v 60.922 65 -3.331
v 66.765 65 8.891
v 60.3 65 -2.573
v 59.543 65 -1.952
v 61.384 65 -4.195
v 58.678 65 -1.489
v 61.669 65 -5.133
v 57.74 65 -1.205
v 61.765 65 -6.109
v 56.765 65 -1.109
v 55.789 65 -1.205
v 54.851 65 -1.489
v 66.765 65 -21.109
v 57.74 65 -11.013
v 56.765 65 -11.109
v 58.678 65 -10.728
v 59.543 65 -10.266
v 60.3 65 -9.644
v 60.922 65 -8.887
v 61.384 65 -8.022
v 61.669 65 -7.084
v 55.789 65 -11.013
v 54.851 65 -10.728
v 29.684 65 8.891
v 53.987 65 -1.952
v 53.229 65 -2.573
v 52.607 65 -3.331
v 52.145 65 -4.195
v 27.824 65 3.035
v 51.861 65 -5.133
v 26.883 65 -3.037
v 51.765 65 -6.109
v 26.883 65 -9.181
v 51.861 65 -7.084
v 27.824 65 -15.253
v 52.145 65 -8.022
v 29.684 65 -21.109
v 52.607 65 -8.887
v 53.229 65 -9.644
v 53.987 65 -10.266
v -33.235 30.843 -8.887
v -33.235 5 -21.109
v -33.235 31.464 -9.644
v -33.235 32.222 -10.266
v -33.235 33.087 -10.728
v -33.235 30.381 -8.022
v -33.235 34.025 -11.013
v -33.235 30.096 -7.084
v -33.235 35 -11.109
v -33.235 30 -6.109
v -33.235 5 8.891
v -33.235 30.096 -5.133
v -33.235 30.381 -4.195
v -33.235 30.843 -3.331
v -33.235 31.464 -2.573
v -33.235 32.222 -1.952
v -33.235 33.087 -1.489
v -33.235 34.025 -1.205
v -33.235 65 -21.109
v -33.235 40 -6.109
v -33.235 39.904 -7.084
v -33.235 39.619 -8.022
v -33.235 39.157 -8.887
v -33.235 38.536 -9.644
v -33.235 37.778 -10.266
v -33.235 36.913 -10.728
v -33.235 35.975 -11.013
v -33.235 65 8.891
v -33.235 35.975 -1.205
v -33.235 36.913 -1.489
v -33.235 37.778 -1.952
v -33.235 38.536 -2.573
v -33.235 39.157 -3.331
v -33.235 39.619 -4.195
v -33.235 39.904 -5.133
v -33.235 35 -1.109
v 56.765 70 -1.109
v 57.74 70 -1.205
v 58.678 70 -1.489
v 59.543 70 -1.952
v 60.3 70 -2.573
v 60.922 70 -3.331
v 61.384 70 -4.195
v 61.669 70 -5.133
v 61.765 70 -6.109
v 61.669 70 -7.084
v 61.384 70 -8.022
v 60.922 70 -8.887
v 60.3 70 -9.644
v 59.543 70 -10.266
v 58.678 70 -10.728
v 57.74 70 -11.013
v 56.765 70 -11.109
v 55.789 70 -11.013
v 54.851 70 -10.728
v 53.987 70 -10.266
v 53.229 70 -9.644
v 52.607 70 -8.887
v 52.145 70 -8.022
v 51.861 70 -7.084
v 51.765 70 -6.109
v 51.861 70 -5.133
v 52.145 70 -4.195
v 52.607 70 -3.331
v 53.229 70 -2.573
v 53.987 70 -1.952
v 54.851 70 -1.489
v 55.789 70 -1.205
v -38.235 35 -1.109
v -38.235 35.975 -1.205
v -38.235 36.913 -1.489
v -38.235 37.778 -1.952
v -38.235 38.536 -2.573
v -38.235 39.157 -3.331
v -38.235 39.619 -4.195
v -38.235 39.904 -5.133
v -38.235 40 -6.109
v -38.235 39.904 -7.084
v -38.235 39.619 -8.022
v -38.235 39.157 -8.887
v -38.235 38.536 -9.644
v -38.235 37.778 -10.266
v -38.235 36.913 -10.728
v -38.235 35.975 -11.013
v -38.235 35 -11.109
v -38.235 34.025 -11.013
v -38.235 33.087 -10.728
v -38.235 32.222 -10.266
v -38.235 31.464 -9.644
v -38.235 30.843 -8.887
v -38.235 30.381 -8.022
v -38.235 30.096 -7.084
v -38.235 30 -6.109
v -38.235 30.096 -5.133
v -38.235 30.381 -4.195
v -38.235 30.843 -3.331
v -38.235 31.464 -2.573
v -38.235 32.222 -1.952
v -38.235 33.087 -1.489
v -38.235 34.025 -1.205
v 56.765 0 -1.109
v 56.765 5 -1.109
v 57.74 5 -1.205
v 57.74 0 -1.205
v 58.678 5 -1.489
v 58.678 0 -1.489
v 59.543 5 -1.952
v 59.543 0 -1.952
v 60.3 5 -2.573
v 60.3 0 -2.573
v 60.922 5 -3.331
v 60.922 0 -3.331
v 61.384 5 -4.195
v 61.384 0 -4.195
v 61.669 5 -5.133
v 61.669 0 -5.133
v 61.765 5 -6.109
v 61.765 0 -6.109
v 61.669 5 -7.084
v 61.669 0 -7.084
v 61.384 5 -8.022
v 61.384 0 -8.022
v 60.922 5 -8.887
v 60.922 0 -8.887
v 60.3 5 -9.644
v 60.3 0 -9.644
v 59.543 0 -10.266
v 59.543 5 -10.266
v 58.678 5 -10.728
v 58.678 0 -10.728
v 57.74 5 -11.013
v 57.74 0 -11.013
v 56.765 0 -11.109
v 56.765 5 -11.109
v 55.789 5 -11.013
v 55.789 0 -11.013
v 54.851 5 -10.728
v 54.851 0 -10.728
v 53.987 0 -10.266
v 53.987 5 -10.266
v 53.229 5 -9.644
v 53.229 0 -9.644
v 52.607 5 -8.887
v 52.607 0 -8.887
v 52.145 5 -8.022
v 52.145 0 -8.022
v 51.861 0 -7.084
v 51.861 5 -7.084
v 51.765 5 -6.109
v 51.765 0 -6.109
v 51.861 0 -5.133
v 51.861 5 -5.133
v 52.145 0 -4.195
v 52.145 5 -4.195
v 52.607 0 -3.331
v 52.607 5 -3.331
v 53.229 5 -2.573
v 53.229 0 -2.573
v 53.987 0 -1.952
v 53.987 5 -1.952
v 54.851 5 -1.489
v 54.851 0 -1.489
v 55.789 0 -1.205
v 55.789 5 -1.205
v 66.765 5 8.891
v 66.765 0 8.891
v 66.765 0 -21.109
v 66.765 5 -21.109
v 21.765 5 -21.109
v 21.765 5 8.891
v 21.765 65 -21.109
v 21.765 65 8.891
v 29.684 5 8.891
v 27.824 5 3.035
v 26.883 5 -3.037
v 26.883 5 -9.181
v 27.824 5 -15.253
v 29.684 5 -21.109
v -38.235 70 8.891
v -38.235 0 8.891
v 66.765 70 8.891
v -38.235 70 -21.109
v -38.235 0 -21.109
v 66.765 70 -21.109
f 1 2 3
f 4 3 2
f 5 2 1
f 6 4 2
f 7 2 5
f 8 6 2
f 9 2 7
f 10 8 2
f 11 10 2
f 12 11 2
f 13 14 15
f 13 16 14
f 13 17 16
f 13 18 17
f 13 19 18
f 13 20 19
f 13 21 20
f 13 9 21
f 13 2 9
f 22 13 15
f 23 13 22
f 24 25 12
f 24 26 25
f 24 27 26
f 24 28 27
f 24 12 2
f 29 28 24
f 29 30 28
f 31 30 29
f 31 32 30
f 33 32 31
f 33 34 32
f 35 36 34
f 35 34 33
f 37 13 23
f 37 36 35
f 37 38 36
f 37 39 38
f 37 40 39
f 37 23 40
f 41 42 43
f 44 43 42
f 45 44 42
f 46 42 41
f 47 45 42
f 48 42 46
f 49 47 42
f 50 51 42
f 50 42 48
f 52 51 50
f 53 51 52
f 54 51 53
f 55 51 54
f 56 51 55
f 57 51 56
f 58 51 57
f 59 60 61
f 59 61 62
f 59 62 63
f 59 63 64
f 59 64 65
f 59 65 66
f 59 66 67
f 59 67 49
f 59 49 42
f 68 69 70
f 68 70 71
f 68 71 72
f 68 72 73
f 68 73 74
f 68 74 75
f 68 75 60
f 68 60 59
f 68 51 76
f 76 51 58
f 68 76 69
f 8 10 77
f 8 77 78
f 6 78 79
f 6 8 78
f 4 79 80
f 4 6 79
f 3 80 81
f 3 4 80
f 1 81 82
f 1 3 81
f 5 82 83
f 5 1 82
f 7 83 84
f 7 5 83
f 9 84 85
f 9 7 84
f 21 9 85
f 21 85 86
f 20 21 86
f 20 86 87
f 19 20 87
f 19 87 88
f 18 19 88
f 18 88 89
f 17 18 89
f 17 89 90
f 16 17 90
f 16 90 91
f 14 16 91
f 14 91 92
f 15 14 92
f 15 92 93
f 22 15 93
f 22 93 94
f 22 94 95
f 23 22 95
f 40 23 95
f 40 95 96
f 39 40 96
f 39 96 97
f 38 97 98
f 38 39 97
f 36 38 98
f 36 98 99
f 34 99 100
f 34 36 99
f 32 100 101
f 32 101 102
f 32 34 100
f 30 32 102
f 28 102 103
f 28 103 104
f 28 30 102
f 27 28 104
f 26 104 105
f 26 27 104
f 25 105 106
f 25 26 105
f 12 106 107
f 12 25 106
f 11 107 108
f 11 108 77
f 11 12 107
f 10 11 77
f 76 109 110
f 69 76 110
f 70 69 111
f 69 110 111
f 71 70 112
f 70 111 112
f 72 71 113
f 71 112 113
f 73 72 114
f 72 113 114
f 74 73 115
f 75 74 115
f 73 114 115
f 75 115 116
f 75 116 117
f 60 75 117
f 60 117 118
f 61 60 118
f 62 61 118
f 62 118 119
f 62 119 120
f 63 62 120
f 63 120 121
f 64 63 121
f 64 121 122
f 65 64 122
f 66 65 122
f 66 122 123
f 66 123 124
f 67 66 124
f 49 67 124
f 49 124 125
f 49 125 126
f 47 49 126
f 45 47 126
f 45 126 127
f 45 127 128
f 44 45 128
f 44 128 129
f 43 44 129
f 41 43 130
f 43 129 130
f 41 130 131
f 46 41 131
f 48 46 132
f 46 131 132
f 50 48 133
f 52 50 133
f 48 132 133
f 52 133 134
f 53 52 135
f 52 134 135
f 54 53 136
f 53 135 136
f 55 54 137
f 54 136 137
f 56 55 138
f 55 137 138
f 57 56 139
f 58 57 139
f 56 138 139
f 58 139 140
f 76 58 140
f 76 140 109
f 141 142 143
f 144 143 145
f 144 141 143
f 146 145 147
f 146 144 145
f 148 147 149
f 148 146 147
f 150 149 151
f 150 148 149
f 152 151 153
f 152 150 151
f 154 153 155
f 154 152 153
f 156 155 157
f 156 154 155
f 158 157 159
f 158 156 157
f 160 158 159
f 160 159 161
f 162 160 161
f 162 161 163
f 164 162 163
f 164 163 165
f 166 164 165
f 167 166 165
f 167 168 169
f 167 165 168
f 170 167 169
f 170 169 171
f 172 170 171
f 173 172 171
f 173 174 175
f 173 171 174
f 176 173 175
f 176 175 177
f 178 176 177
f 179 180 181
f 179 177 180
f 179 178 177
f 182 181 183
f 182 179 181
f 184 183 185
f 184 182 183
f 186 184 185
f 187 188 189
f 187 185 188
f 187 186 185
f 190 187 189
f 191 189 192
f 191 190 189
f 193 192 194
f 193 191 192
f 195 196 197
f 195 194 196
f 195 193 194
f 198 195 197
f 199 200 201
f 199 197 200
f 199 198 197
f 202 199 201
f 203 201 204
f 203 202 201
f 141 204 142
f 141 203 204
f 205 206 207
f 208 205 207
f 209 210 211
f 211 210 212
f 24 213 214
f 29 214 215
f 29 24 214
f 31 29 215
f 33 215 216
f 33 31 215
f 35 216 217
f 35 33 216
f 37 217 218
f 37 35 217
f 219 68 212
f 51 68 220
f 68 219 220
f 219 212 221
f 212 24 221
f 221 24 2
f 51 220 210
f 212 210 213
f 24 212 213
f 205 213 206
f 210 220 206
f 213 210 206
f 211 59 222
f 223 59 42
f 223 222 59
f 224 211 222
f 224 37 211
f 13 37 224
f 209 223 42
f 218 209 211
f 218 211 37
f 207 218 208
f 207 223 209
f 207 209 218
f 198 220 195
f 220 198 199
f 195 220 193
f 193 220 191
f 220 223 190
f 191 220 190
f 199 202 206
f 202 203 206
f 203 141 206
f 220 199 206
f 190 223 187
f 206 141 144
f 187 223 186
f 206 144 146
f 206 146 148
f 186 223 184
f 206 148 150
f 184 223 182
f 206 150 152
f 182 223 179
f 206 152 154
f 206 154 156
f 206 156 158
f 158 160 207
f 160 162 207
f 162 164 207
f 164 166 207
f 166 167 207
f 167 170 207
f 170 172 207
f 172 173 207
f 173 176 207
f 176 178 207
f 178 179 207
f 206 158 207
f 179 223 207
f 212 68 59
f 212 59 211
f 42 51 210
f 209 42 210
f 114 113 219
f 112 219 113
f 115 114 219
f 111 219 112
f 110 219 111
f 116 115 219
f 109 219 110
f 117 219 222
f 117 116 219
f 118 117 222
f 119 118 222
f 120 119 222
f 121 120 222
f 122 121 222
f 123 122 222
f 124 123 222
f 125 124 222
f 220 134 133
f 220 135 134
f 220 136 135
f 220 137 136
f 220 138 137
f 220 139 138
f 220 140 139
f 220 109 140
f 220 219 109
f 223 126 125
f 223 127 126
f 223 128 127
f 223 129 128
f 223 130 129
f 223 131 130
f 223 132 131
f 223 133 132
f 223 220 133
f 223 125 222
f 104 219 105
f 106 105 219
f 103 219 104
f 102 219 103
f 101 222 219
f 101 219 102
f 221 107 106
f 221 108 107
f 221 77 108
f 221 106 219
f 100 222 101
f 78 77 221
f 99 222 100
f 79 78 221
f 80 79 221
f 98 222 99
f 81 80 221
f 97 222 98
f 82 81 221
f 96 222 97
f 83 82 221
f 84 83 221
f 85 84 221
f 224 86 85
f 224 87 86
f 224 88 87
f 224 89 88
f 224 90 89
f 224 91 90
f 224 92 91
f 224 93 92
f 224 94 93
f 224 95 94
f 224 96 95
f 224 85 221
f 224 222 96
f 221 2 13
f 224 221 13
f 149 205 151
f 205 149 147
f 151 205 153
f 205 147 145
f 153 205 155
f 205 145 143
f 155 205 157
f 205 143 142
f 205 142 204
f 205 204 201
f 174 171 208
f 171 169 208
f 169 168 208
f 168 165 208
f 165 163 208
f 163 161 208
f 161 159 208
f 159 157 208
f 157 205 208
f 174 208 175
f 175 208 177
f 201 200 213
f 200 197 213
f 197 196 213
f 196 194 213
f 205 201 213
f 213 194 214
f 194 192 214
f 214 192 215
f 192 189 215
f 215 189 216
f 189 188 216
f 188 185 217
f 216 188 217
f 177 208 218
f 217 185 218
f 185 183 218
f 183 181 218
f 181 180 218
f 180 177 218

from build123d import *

# Parameters (mm, degrees)
CROQUIS1_W                 = 105
CROQUIS1_H                 = 30
CROQUIS1_R                 = 5
SALIENTE_EXTRUIR1_DEPTH    = 70
CORTAR_EXTRUIR1_DEPTH      = 30
CORTAR_EXTRUIR1_DEPTH_BACK = 30
CROQUIS2_R                 = 40
CROQUIS3_R                 = 5
CORTAR_EXTRUIR2_DEPTH      = 30
CROQUIS4_W                 = 55
CROQUIS4_H                 = 60
CORTAR_EXTRUIR3_DEPTH      = 30


with BuildPart() as part:
    # Croquis1 → Saliente-Extruir1 (new body)
    with BuildSketch(Plane(origin=(0, 0, 0), x_dir=(1, 0, 0), z_dir=(0, 1, 0))):
        with Locations((14.264686972, 6.108870968)):
            Rectangle(CROQUIS1_W, CROQUIS1_H)
        with Locations(Location((56.764686972, 6.108870968, 0), (0, 0, 270))):
            Circle(CROQUIS1_R, mode=Mode.SUBTRACT)
    extrude(amount=SALIENTE_EXTRUIR1_DEPTH)

    # Croquis2 → Cortar-Extruir1 (cut, two sides: drawn at the far end of the back side and taken through both)
    with BuildSketch(Plane(origin=(0, 35, 0), x_dir=(-1, 0, 0), z_dir=(0, -1, 0)).offset(-CORTAR_EXTRUIR1_DEPTH_BACK)):
        with Locations((-66.764686972, 6.108870968)):
            Circle(CROQUIS2_R)
    extrude(amount=CORTAR_EXTRUIR1_DEPTH + CORTAR_EXTRUIR1_DEPTH_BACK, mode=Mode.SUBTRACT)

    # Croquis3 → Cortar-Extruir2 (cut)
    with BuildSketch(Plane.ZY.offset(38.235313028)):
        with Locations((-6.108870968, 35)):
            Circle(CROQUIS3_R)
    extrude(amount=-CORTAR_EXTRUIR2_DEPTH, mode=Mode.SUBTRACT)

    # Croquis4 → Cortar-Extruir3 (cut)
    with BuildSketch(Plane.XY.offset(8.891129032)):
        with Locations((-5.735313028, 35)):
            Rectangle(CROQUIS4_W, CROQUIS4_H)
    extrude(amount=-CORTAR_EXTRUIR3_DEPTH, mode=Mode.SUBTRACT)


solid = part.part
